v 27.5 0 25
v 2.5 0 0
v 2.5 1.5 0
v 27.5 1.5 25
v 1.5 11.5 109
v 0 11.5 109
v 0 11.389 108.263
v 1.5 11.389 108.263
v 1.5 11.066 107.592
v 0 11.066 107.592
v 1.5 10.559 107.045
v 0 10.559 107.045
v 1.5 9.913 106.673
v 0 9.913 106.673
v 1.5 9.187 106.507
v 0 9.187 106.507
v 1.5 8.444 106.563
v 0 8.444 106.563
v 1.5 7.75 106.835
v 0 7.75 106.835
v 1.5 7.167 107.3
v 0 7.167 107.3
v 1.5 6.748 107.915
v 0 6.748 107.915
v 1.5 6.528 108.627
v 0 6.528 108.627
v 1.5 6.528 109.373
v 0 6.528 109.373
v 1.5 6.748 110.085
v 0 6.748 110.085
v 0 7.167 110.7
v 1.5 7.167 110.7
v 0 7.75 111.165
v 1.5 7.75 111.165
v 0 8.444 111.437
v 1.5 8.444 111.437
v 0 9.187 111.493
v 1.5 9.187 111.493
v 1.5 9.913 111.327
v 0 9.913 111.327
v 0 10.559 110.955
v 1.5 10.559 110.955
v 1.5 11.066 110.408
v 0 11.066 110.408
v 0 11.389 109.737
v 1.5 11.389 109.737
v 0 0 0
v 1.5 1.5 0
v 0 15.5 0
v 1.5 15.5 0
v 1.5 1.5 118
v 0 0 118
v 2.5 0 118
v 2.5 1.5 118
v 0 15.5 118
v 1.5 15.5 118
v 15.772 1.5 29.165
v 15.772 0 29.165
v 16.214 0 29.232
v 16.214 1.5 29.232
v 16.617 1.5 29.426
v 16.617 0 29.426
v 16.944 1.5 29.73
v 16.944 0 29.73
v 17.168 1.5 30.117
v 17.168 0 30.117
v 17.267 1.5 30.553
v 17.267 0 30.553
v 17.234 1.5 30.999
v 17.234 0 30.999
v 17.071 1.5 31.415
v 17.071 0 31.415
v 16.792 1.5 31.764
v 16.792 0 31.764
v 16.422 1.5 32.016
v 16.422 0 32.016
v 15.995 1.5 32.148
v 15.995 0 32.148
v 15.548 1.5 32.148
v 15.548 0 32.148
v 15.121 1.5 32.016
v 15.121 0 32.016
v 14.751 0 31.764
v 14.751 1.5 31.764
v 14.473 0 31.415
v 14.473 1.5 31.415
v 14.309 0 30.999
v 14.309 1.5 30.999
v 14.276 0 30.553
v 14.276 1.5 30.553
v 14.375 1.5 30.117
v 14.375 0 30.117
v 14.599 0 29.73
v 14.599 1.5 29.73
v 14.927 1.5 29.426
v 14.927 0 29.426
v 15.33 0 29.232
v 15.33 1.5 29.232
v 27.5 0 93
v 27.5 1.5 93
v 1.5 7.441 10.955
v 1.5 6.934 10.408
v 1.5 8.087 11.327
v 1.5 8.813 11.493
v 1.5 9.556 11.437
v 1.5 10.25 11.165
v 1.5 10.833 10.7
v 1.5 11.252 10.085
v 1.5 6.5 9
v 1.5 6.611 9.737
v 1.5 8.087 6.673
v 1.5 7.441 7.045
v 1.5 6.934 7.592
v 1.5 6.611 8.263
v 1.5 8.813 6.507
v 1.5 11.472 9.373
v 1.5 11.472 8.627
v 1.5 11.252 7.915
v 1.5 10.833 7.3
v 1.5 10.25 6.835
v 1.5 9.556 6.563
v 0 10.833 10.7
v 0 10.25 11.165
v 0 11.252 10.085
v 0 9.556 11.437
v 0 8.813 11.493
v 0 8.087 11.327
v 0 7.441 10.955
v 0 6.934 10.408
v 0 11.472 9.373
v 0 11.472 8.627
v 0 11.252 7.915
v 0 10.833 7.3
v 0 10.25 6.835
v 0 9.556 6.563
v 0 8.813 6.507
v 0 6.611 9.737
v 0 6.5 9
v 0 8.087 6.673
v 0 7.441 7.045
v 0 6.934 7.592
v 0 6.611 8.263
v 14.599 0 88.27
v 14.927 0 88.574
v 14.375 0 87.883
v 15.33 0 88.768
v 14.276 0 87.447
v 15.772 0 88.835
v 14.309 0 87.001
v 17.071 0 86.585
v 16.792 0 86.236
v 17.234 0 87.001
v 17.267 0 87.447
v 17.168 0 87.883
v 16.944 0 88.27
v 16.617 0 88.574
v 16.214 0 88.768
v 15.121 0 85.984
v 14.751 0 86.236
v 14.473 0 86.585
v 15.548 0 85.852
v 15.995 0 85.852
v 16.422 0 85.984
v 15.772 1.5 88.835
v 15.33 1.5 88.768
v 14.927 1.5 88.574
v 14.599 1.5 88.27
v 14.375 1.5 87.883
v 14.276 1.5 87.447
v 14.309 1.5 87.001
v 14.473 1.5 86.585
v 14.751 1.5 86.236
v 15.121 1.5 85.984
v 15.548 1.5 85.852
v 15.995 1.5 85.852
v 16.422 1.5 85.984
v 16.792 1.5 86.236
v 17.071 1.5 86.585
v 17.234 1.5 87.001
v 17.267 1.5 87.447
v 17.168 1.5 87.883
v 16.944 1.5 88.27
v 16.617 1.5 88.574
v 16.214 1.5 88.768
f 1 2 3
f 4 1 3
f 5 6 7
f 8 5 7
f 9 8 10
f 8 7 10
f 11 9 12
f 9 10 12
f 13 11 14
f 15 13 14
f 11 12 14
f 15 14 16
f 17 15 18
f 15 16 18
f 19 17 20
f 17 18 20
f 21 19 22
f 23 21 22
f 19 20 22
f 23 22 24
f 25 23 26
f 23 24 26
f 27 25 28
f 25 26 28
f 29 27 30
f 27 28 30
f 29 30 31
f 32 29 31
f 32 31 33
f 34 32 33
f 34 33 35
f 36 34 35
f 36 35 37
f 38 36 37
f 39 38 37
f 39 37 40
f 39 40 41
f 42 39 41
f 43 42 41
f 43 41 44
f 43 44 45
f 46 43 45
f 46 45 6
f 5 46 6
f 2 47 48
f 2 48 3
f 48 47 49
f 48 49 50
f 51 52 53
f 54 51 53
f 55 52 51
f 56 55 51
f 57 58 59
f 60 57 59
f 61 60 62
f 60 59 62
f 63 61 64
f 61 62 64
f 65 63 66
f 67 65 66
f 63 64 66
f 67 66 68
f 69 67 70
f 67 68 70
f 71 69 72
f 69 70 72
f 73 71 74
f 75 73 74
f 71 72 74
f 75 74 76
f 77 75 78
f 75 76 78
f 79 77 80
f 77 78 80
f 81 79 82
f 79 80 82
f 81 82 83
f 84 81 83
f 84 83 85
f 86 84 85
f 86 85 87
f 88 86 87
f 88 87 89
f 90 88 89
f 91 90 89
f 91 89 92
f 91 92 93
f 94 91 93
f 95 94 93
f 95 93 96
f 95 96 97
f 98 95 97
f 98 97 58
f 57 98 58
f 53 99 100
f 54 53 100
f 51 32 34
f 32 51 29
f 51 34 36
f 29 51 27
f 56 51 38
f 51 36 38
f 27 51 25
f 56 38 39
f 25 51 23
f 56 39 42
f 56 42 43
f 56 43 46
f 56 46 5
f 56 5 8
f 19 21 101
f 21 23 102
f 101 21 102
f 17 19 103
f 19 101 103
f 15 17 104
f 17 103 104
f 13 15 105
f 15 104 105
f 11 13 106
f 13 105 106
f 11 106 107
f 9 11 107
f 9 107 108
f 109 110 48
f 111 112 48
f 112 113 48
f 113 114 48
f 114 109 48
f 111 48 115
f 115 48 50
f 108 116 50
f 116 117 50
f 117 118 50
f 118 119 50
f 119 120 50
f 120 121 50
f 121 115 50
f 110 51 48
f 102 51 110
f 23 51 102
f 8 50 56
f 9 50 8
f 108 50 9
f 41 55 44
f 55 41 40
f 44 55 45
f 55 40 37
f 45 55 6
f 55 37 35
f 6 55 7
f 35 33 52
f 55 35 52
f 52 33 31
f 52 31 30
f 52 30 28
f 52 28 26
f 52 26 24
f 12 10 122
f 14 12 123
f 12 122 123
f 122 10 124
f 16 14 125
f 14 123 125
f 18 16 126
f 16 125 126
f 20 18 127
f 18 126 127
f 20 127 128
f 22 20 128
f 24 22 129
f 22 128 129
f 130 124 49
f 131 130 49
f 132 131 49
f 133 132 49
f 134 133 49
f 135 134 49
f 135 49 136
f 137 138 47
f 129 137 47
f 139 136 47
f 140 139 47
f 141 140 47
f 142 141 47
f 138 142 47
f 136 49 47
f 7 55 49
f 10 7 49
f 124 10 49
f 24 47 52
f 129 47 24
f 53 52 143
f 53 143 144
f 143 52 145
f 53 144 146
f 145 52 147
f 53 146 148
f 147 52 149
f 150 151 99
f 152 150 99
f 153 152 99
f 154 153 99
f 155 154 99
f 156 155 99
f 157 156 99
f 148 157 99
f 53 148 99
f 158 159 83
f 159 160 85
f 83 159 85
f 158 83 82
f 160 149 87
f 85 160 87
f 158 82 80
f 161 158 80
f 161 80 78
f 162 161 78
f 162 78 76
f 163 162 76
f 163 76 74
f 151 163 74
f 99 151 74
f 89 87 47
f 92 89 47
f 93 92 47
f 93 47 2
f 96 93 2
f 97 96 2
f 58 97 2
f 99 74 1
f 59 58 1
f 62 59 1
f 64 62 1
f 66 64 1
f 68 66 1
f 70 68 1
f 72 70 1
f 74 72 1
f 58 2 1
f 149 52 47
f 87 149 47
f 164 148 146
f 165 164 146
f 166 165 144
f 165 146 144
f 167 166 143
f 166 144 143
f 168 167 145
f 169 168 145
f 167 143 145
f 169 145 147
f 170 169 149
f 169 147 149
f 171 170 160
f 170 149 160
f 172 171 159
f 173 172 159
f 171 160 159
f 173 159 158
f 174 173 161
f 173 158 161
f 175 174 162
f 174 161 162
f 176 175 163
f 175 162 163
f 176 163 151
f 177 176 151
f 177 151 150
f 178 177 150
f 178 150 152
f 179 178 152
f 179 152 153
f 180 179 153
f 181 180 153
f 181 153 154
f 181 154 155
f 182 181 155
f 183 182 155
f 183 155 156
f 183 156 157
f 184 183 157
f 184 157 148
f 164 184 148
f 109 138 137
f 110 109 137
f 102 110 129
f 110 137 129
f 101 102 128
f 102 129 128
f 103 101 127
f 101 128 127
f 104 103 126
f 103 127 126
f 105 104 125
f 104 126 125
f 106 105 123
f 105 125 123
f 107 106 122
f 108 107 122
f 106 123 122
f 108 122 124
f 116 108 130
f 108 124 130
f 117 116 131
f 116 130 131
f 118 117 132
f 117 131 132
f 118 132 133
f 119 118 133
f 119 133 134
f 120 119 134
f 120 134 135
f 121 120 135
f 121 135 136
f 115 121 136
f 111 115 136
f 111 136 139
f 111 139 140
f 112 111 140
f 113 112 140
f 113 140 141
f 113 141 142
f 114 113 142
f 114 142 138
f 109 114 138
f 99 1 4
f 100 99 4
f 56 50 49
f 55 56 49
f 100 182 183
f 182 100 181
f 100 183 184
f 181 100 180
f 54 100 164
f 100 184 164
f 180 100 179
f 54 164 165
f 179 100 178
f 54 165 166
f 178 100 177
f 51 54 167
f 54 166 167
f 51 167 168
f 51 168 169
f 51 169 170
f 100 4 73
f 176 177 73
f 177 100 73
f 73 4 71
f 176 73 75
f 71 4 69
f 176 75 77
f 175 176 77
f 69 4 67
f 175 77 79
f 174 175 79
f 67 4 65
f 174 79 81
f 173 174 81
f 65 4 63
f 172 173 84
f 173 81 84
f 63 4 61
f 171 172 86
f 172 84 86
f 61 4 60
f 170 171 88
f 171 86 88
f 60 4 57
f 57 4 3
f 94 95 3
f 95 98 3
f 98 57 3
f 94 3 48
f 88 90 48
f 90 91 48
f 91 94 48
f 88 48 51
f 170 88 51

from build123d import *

# Parameters (mm, degrees)
EXTRU_MINCE1_DEPTH      = 118
ESQUISSE2_R             = 2.5
ENL_V_MAT_EXTRU_1_DEPTH = 4
ESQUISSE3_R             = 1.5
ENL_V_MAT_EXTRU_2_DEPTH = 4
CHANFREIN1_SIZE         = 25


with BuildPart() as part:
    # Esquisse1 → Extru.-Mince1 (new body)
    with BuildSketch(Plane.XY):
        Polygon((0, 15.5), (0, 0), (27.5, 0), (27.5, 1.5), (1.5, 1.5), (1.5, 15.5), align=None)
    extrude(amount=EXTRU_MINCE1_DEPTH)

    # Esquisse2 → Enlèv. mat.-Extru.1 (cut)
    with BuildSketch(Plane.ZY):
        with Locations(Location((9, 9, 0), (0, 0, 270))):
            Circle(ESQUISSE2_R)
        with Locations(Location((109, 9, 0), (0, 0, 90))):
            Circle(ESQUISSE2_R)
    extrude(amount=-ENL_V_MAT_EXTRU_1_DEPTH, mode=Mode.SUBTRACT)

    # Esquisse3 → Enlèv. mat.-Extru.2 (cut)
    with BuildSketch(Plane.XZ):
        with Locations(Location((15.771636742, 30.664864187, 0), (0, 0, 270))):
            Circle(ESQUISSE3_R)
        with Locations(Location((15.771636742, 87.335135813, 0), (0, 0, 90))):
            Circle(ESQUISSE3_R)
    extrude(amount=-ENL_V_MAT_EXTRU_2_DEPTH, mode=Mode.SUBTRACT)

    # Chanfrein1
    chanfrein1_edges = [part.edges().sort_by_distance(p)[0] for p in [
        (27.5, 0.75, 0),
        (27.5, 0.75, 118),
    ]]
    chamfer(chanfrein1_edges, length=CHANFREIN1_SIZE)


solid = part.part
